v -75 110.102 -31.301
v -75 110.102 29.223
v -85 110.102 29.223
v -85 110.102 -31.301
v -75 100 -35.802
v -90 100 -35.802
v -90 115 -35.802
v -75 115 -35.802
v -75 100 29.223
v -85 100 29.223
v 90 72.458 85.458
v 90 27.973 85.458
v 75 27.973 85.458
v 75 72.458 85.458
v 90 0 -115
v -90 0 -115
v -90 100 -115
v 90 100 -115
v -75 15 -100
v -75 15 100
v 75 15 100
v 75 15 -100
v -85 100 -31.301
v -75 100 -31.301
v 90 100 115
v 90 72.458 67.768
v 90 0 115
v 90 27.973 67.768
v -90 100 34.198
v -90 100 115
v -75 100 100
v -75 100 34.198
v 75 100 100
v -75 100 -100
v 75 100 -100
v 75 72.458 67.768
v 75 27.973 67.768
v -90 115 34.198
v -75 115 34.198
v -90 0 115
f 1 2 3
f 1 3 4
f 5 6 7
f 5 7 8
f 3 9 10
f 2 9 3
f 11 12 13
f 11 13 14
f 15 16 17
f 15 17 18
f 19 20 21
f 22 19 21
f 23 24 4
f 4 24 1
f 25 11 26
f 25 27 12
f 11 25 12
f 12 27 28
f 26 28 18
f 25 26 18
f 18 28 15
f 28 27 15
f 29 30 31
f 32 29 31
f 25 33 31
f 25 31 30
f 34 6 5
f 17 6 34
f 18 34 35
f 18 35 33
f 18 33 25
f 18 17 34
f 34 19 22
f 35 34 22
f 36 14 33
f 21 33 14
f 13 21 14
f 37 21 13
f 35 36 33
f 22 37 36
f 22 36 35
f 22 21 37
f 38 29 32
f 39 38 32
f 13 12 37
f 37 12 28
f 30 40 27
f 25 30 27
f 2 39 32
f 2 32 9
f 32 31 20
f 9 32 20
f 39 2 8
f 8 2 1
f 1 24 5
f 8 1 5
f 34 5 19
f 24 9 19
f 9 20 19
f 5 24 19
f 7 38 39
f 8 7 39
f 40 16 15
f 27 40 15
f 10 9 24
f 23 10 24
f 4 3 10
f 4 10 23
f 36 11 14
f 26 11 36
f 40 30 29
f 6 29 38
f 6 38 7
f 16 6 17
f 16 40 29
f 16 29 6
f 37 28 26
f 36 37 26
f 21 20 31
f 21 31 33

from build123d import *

# Parameters (mm, degrees)
SKETCH1_W           = 180
SKETCH1_H           = 230
SKETCH1_W_2         = 150
SKETCH1_H_2         = 200
BOSS_EXTRUDE1_DEPTH = 100
SKETCH2_W           = 180
SKETCH2_H           = 230
BOSS_EXTRUDE2_DEPTH = 15
SKETCH3_W           = 15
SKETCH3_H           = 70
BOSS_EXTRUDE3_DEPTH = 15
SKETCH4_W           = 60.52486508
SKETCH4_H           = 10.102082312
CUT_EXTRUDE1_DEPTH  = 10
SKETCH5_W           = 17.690019853
SKETCH5_H           = 44.485196982
CUT_EXTRUDE2_DEPTH  = 20


with BuildPart() as part:
    # Sketch1 → Boss-Extrude1 (new body)
    with BuildSketch(Plane(origin=(0, 0, 0), x_dir=(1, 0, 0), z_dir=(0, 1, 0))):
        Rectangle(SKETCH1_W, SKETCH1_H)
        Rectangle(SKETCH1_W_2, SKETCH1_H_2, mode=Mode.SUBTRACT)
    extrude(amount=BOSS_EXTRUDE1_DEPTH)

    # Sketch2 → Boss-Extrude2 (add)
    with BuildSketch(Plane.XZ):
        Rectangle(SKETCH2_W, SKETCH2_H)
    extrude(amount=-BOSS_EXTRUDE2_DEPTH)

    # Sketch3 → Boss-Extrude3 (add)
    with BuildSketch(Plane(origin=(0, 100, 0), x_dir=(1, 0, 0), z_dir=(0, 1, 0))):
        with Locations((-82.5, 0.801504388)):
            Rectangle(SKETCH3_W, SKETCH3_H)
    extrude(amount=BOSS_EXTRUDE3_DEPTH)

    # Sketch4 → Cut-Extrude1 (cut)
    with BuildSketch(Plane(origin=(-75, 0, 0), x_dir=(0, 0, -1), z_dir=(1, 0, 0))):
        with Locations((1.039053478, 105.051041156)):
            Rectangle(SKETCH4_W, SKETCH4_H)
    extrude(amount=-CUT_EXTRUDE1_DEPTH, mode=Mode.SUBTRACT)

    # Sketch5 → Cut-Extrude2 (cut)
    with BuildSketch(Plane(origin=(90, 0, 0), x_dir=(0, 0, -1), z_dir=(1, 0, 0))):
        with Locations((-76.613394803, 50.215874178)):
            Rectangle(SKETCH5_W, SKETCH5_H)
    extrude(amount=-CUT_EXTRUDE2_DEPTH, mode=Mode.SUBTRACT)


solid = part.part
